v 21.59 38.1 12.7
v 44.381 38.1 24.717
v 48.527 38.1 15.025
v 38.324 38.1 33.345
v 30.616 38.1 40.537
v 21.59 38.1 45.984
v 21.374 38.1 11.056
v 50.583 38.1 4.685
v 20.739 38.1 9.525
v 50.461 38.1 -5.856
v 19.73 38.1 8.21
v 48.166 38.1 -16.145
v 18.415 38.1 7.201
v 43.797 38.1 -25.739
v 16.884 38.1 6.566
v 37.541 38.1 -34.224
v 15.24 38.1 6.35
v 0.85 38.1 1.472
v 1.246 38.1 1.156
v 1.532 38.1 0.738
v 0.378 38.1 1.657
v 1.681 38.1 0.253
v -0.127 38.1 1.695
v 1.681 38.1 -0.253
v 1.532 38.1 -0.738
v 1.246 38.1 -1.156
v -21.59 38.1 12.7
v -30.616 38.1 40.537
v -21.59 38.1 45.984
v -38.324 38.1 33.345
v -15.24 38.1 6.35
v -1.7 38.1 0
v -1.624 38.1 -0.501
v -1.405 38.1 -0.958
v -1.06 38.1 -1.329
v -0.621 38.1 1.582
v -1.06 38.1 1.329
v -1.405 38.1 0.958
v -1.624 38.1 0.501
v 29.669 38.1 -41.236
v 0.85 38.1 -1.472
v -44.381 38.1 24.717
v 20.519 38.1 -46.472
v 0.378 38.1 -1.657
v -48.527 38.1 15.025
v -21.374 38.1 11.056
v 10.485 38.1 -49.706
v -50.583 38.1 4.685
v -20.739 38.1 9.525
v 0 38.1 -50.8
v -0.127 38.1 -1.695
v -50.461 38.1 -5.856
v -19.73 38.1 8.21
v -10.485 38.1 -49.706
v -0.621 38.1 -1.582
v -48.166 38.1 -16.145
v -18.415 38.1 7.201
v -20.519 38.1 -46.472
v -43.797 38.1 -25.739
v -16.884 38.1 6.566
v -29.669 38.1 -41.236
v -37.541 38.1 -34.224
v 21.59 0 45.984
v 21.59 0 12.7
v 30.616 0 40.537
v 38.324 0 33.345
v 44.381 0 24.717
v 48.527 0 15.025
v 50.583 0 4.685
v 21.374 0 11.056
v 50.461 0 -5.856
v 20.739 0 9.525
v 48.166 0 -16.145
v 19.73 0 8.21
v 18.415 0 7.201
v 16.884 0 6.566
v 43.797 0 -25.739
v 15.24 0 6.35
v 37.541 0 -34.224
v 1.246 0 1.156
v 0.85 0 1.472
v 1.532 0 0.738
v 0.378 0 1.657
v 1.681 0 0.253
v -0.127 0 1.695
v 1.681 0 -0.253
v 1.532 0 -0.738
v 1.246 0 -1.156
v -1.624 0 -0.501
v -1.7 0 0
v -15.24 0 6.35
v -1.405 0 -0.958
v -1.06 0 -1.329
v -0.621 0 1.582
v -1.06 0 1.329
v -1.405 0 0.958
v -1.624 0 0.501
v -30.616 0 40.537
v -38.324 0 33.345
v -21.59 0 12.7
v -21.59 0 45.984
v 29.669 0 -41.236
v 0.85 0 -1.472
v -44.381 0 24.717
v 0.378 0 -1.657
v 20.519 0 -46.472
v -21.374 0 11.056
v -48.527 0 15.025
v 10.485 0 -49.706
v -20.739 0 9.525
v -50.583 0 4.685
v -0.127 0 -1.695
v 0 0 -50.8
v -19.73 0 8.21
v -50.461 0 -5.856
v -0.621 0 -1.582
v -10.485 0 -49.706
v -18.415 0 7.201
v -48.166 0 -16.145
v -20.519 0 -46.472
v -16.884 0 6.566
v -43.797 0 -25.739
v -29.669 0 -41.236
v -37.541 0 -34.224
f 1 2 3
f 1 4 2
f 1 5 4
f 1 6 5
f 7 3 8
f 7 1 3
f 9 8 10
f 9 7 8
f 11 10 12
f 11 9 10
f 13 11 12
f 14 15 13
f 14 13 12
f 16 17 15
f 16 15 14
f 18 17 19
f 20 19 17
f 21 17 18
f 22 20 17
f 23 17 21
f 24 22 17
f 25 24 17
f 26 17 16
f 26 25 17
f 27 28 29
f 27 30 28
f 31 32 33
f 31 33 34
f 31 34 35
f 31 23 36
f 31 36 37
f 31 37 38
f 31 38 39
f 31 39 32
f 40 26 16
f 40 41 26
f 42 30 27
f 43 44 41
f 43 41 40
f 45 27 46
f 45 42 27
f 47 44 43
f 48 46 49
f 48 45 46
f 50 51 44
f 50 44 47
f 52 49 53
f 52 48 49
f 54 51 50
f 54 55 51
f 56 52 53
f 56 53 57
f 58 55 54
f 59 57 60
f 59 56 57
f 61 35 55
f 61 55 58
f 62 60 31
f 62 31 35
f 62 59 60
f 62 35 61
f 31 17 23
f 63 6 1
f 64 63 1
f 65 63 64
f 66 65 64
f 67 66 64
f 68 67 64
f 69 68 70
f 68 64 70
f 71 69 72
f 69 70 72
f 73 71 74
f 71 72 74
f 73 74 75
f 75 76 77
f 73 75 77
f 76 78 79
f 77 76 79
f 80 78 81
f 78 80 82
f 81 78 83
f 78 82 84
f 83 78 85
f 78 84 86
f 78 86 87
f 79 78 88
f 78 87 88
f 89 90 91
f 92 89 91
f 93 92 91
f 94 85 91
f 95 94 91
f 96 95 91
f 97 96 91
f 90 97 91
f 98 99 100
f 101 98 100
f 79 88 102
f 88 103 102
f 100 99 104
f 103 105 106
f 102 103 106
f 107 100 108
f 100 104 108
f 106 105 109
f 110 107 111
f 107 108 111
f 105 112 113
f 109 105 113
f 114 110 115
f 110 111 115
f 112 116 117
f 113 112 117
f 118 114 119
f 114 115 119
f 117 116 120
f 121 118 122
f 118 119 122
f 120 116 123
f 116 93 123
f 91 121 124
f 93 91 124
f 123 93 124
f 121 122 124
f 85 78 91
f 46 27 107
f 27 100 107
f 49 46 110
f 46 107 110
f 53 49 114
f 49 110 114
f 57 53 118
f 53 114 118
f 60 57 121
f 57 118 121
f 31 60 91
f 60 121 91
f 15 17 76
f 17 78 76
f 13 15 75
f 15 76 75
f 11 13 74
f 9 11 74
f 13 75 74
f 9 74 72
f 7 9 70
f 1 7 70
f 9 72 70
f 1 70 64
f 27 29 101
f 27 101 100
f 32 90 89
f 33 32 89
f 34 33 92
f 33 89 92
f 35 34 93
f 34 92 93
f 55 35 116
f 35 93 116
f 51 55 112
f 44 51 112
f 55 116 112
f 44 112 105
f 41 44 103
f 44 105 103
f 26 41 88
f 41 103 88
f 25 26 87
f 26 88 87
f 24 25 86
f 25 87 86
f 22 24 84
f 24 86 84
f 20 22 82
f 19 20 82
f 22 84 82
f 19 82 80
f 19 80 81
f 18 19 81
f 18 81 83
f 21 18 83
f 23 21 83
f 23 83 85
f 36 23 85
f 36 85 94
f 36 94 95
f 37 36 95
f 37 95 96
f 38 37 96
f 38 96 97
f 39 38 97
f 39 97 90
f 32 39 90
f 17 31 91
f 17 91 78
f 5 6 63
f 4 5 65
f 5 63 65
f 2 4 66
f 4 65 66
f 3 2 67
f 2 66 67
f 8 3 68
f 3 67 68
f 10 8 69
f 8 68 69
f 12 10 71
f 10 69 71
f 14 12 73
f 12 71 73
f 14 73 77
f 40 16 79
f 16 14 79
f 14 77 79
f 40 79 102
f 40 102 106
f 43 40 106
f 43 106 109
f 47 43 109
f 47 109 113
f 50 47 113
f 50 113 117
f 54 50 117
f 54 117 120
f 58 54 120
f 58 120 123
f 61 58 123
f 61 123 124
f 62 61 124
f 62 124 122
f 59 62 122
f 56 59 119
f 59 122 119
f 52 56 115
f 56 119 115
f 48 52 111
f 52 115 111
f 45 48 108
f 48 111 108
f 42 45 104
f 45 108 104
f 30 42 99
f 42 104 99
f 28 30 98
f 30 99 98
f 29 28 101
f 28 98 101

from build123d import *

# Parameters (mm, degrees)
SKETCH1_R            = 50.8
BOSS_EXTRUDE1_DEPTH  = 38.1
CUT_EXTRUDE1_REACH   = 83.32
SKETCH2_W            = 43.18
SKETCH2_H            = 44.45
FILLET1_R            = 6.35
M3_CLEARANCE_HOLE1_D = 3.4


with BuildPart() as part:
    # Sketch1 → Boss-Extrude1 (new body)
    with BuildSketch(Plane(origin=(0, 0, 0), x_dir=(1, 0, 0), z_dir=(0, 1, 0))):
        with Locations(Location((0, 0, 0), (0, 0, 90))):
            Circle(SKETCH1_R)
    extrude(amount=BOSS_EXTRUDE1_DEPTH)

    # Sketch2 → Cut-Extrude1 (cut, up to next)
    with BuildSketch(Plane(origin=(0, 38.1, 0), x_dir=(1, 0, 0), z_dir=(0, 1, 0)), mode=Mode.PRIVATE) as cut_extrude1_sk1:
        with Locations((0, -28.575)):
            Rectangle(SKETCH2_W, SKETCH2_H)
    cut_extrude1_tool1 = extrude(cut_extrude1_sk1.sketch, amount=-CUT_EXTRUDE1_REACH, mode=Mode.PRIVATE) & part.part
    add(cut_extrude1_tool1.solids().sort_by_distance((0, 38.1, 28.575))[0], mode=Mode.SUBTRACT)

    # Fillet1
    fillet1_edges = [part.edges().sort_by_distance(p)[0] for p in [
        (-21.59, 19.05, 6.35),
        (21.59, 19.05, 6.35),
    ]]
    fillet(fillet1_edges, radius=FILLET1_R)

    # M3 Clearance Hole1 (through all)
    with Locations(Plane(origin=(0, 38.1, 0), x_dir=(1, 0, 0), z_dir=(0, 1, 0))):
        with Locations((0, 0)):
            Hole(M3_CLEARANCE_HOLE1_D / 2)


solid = part.part
